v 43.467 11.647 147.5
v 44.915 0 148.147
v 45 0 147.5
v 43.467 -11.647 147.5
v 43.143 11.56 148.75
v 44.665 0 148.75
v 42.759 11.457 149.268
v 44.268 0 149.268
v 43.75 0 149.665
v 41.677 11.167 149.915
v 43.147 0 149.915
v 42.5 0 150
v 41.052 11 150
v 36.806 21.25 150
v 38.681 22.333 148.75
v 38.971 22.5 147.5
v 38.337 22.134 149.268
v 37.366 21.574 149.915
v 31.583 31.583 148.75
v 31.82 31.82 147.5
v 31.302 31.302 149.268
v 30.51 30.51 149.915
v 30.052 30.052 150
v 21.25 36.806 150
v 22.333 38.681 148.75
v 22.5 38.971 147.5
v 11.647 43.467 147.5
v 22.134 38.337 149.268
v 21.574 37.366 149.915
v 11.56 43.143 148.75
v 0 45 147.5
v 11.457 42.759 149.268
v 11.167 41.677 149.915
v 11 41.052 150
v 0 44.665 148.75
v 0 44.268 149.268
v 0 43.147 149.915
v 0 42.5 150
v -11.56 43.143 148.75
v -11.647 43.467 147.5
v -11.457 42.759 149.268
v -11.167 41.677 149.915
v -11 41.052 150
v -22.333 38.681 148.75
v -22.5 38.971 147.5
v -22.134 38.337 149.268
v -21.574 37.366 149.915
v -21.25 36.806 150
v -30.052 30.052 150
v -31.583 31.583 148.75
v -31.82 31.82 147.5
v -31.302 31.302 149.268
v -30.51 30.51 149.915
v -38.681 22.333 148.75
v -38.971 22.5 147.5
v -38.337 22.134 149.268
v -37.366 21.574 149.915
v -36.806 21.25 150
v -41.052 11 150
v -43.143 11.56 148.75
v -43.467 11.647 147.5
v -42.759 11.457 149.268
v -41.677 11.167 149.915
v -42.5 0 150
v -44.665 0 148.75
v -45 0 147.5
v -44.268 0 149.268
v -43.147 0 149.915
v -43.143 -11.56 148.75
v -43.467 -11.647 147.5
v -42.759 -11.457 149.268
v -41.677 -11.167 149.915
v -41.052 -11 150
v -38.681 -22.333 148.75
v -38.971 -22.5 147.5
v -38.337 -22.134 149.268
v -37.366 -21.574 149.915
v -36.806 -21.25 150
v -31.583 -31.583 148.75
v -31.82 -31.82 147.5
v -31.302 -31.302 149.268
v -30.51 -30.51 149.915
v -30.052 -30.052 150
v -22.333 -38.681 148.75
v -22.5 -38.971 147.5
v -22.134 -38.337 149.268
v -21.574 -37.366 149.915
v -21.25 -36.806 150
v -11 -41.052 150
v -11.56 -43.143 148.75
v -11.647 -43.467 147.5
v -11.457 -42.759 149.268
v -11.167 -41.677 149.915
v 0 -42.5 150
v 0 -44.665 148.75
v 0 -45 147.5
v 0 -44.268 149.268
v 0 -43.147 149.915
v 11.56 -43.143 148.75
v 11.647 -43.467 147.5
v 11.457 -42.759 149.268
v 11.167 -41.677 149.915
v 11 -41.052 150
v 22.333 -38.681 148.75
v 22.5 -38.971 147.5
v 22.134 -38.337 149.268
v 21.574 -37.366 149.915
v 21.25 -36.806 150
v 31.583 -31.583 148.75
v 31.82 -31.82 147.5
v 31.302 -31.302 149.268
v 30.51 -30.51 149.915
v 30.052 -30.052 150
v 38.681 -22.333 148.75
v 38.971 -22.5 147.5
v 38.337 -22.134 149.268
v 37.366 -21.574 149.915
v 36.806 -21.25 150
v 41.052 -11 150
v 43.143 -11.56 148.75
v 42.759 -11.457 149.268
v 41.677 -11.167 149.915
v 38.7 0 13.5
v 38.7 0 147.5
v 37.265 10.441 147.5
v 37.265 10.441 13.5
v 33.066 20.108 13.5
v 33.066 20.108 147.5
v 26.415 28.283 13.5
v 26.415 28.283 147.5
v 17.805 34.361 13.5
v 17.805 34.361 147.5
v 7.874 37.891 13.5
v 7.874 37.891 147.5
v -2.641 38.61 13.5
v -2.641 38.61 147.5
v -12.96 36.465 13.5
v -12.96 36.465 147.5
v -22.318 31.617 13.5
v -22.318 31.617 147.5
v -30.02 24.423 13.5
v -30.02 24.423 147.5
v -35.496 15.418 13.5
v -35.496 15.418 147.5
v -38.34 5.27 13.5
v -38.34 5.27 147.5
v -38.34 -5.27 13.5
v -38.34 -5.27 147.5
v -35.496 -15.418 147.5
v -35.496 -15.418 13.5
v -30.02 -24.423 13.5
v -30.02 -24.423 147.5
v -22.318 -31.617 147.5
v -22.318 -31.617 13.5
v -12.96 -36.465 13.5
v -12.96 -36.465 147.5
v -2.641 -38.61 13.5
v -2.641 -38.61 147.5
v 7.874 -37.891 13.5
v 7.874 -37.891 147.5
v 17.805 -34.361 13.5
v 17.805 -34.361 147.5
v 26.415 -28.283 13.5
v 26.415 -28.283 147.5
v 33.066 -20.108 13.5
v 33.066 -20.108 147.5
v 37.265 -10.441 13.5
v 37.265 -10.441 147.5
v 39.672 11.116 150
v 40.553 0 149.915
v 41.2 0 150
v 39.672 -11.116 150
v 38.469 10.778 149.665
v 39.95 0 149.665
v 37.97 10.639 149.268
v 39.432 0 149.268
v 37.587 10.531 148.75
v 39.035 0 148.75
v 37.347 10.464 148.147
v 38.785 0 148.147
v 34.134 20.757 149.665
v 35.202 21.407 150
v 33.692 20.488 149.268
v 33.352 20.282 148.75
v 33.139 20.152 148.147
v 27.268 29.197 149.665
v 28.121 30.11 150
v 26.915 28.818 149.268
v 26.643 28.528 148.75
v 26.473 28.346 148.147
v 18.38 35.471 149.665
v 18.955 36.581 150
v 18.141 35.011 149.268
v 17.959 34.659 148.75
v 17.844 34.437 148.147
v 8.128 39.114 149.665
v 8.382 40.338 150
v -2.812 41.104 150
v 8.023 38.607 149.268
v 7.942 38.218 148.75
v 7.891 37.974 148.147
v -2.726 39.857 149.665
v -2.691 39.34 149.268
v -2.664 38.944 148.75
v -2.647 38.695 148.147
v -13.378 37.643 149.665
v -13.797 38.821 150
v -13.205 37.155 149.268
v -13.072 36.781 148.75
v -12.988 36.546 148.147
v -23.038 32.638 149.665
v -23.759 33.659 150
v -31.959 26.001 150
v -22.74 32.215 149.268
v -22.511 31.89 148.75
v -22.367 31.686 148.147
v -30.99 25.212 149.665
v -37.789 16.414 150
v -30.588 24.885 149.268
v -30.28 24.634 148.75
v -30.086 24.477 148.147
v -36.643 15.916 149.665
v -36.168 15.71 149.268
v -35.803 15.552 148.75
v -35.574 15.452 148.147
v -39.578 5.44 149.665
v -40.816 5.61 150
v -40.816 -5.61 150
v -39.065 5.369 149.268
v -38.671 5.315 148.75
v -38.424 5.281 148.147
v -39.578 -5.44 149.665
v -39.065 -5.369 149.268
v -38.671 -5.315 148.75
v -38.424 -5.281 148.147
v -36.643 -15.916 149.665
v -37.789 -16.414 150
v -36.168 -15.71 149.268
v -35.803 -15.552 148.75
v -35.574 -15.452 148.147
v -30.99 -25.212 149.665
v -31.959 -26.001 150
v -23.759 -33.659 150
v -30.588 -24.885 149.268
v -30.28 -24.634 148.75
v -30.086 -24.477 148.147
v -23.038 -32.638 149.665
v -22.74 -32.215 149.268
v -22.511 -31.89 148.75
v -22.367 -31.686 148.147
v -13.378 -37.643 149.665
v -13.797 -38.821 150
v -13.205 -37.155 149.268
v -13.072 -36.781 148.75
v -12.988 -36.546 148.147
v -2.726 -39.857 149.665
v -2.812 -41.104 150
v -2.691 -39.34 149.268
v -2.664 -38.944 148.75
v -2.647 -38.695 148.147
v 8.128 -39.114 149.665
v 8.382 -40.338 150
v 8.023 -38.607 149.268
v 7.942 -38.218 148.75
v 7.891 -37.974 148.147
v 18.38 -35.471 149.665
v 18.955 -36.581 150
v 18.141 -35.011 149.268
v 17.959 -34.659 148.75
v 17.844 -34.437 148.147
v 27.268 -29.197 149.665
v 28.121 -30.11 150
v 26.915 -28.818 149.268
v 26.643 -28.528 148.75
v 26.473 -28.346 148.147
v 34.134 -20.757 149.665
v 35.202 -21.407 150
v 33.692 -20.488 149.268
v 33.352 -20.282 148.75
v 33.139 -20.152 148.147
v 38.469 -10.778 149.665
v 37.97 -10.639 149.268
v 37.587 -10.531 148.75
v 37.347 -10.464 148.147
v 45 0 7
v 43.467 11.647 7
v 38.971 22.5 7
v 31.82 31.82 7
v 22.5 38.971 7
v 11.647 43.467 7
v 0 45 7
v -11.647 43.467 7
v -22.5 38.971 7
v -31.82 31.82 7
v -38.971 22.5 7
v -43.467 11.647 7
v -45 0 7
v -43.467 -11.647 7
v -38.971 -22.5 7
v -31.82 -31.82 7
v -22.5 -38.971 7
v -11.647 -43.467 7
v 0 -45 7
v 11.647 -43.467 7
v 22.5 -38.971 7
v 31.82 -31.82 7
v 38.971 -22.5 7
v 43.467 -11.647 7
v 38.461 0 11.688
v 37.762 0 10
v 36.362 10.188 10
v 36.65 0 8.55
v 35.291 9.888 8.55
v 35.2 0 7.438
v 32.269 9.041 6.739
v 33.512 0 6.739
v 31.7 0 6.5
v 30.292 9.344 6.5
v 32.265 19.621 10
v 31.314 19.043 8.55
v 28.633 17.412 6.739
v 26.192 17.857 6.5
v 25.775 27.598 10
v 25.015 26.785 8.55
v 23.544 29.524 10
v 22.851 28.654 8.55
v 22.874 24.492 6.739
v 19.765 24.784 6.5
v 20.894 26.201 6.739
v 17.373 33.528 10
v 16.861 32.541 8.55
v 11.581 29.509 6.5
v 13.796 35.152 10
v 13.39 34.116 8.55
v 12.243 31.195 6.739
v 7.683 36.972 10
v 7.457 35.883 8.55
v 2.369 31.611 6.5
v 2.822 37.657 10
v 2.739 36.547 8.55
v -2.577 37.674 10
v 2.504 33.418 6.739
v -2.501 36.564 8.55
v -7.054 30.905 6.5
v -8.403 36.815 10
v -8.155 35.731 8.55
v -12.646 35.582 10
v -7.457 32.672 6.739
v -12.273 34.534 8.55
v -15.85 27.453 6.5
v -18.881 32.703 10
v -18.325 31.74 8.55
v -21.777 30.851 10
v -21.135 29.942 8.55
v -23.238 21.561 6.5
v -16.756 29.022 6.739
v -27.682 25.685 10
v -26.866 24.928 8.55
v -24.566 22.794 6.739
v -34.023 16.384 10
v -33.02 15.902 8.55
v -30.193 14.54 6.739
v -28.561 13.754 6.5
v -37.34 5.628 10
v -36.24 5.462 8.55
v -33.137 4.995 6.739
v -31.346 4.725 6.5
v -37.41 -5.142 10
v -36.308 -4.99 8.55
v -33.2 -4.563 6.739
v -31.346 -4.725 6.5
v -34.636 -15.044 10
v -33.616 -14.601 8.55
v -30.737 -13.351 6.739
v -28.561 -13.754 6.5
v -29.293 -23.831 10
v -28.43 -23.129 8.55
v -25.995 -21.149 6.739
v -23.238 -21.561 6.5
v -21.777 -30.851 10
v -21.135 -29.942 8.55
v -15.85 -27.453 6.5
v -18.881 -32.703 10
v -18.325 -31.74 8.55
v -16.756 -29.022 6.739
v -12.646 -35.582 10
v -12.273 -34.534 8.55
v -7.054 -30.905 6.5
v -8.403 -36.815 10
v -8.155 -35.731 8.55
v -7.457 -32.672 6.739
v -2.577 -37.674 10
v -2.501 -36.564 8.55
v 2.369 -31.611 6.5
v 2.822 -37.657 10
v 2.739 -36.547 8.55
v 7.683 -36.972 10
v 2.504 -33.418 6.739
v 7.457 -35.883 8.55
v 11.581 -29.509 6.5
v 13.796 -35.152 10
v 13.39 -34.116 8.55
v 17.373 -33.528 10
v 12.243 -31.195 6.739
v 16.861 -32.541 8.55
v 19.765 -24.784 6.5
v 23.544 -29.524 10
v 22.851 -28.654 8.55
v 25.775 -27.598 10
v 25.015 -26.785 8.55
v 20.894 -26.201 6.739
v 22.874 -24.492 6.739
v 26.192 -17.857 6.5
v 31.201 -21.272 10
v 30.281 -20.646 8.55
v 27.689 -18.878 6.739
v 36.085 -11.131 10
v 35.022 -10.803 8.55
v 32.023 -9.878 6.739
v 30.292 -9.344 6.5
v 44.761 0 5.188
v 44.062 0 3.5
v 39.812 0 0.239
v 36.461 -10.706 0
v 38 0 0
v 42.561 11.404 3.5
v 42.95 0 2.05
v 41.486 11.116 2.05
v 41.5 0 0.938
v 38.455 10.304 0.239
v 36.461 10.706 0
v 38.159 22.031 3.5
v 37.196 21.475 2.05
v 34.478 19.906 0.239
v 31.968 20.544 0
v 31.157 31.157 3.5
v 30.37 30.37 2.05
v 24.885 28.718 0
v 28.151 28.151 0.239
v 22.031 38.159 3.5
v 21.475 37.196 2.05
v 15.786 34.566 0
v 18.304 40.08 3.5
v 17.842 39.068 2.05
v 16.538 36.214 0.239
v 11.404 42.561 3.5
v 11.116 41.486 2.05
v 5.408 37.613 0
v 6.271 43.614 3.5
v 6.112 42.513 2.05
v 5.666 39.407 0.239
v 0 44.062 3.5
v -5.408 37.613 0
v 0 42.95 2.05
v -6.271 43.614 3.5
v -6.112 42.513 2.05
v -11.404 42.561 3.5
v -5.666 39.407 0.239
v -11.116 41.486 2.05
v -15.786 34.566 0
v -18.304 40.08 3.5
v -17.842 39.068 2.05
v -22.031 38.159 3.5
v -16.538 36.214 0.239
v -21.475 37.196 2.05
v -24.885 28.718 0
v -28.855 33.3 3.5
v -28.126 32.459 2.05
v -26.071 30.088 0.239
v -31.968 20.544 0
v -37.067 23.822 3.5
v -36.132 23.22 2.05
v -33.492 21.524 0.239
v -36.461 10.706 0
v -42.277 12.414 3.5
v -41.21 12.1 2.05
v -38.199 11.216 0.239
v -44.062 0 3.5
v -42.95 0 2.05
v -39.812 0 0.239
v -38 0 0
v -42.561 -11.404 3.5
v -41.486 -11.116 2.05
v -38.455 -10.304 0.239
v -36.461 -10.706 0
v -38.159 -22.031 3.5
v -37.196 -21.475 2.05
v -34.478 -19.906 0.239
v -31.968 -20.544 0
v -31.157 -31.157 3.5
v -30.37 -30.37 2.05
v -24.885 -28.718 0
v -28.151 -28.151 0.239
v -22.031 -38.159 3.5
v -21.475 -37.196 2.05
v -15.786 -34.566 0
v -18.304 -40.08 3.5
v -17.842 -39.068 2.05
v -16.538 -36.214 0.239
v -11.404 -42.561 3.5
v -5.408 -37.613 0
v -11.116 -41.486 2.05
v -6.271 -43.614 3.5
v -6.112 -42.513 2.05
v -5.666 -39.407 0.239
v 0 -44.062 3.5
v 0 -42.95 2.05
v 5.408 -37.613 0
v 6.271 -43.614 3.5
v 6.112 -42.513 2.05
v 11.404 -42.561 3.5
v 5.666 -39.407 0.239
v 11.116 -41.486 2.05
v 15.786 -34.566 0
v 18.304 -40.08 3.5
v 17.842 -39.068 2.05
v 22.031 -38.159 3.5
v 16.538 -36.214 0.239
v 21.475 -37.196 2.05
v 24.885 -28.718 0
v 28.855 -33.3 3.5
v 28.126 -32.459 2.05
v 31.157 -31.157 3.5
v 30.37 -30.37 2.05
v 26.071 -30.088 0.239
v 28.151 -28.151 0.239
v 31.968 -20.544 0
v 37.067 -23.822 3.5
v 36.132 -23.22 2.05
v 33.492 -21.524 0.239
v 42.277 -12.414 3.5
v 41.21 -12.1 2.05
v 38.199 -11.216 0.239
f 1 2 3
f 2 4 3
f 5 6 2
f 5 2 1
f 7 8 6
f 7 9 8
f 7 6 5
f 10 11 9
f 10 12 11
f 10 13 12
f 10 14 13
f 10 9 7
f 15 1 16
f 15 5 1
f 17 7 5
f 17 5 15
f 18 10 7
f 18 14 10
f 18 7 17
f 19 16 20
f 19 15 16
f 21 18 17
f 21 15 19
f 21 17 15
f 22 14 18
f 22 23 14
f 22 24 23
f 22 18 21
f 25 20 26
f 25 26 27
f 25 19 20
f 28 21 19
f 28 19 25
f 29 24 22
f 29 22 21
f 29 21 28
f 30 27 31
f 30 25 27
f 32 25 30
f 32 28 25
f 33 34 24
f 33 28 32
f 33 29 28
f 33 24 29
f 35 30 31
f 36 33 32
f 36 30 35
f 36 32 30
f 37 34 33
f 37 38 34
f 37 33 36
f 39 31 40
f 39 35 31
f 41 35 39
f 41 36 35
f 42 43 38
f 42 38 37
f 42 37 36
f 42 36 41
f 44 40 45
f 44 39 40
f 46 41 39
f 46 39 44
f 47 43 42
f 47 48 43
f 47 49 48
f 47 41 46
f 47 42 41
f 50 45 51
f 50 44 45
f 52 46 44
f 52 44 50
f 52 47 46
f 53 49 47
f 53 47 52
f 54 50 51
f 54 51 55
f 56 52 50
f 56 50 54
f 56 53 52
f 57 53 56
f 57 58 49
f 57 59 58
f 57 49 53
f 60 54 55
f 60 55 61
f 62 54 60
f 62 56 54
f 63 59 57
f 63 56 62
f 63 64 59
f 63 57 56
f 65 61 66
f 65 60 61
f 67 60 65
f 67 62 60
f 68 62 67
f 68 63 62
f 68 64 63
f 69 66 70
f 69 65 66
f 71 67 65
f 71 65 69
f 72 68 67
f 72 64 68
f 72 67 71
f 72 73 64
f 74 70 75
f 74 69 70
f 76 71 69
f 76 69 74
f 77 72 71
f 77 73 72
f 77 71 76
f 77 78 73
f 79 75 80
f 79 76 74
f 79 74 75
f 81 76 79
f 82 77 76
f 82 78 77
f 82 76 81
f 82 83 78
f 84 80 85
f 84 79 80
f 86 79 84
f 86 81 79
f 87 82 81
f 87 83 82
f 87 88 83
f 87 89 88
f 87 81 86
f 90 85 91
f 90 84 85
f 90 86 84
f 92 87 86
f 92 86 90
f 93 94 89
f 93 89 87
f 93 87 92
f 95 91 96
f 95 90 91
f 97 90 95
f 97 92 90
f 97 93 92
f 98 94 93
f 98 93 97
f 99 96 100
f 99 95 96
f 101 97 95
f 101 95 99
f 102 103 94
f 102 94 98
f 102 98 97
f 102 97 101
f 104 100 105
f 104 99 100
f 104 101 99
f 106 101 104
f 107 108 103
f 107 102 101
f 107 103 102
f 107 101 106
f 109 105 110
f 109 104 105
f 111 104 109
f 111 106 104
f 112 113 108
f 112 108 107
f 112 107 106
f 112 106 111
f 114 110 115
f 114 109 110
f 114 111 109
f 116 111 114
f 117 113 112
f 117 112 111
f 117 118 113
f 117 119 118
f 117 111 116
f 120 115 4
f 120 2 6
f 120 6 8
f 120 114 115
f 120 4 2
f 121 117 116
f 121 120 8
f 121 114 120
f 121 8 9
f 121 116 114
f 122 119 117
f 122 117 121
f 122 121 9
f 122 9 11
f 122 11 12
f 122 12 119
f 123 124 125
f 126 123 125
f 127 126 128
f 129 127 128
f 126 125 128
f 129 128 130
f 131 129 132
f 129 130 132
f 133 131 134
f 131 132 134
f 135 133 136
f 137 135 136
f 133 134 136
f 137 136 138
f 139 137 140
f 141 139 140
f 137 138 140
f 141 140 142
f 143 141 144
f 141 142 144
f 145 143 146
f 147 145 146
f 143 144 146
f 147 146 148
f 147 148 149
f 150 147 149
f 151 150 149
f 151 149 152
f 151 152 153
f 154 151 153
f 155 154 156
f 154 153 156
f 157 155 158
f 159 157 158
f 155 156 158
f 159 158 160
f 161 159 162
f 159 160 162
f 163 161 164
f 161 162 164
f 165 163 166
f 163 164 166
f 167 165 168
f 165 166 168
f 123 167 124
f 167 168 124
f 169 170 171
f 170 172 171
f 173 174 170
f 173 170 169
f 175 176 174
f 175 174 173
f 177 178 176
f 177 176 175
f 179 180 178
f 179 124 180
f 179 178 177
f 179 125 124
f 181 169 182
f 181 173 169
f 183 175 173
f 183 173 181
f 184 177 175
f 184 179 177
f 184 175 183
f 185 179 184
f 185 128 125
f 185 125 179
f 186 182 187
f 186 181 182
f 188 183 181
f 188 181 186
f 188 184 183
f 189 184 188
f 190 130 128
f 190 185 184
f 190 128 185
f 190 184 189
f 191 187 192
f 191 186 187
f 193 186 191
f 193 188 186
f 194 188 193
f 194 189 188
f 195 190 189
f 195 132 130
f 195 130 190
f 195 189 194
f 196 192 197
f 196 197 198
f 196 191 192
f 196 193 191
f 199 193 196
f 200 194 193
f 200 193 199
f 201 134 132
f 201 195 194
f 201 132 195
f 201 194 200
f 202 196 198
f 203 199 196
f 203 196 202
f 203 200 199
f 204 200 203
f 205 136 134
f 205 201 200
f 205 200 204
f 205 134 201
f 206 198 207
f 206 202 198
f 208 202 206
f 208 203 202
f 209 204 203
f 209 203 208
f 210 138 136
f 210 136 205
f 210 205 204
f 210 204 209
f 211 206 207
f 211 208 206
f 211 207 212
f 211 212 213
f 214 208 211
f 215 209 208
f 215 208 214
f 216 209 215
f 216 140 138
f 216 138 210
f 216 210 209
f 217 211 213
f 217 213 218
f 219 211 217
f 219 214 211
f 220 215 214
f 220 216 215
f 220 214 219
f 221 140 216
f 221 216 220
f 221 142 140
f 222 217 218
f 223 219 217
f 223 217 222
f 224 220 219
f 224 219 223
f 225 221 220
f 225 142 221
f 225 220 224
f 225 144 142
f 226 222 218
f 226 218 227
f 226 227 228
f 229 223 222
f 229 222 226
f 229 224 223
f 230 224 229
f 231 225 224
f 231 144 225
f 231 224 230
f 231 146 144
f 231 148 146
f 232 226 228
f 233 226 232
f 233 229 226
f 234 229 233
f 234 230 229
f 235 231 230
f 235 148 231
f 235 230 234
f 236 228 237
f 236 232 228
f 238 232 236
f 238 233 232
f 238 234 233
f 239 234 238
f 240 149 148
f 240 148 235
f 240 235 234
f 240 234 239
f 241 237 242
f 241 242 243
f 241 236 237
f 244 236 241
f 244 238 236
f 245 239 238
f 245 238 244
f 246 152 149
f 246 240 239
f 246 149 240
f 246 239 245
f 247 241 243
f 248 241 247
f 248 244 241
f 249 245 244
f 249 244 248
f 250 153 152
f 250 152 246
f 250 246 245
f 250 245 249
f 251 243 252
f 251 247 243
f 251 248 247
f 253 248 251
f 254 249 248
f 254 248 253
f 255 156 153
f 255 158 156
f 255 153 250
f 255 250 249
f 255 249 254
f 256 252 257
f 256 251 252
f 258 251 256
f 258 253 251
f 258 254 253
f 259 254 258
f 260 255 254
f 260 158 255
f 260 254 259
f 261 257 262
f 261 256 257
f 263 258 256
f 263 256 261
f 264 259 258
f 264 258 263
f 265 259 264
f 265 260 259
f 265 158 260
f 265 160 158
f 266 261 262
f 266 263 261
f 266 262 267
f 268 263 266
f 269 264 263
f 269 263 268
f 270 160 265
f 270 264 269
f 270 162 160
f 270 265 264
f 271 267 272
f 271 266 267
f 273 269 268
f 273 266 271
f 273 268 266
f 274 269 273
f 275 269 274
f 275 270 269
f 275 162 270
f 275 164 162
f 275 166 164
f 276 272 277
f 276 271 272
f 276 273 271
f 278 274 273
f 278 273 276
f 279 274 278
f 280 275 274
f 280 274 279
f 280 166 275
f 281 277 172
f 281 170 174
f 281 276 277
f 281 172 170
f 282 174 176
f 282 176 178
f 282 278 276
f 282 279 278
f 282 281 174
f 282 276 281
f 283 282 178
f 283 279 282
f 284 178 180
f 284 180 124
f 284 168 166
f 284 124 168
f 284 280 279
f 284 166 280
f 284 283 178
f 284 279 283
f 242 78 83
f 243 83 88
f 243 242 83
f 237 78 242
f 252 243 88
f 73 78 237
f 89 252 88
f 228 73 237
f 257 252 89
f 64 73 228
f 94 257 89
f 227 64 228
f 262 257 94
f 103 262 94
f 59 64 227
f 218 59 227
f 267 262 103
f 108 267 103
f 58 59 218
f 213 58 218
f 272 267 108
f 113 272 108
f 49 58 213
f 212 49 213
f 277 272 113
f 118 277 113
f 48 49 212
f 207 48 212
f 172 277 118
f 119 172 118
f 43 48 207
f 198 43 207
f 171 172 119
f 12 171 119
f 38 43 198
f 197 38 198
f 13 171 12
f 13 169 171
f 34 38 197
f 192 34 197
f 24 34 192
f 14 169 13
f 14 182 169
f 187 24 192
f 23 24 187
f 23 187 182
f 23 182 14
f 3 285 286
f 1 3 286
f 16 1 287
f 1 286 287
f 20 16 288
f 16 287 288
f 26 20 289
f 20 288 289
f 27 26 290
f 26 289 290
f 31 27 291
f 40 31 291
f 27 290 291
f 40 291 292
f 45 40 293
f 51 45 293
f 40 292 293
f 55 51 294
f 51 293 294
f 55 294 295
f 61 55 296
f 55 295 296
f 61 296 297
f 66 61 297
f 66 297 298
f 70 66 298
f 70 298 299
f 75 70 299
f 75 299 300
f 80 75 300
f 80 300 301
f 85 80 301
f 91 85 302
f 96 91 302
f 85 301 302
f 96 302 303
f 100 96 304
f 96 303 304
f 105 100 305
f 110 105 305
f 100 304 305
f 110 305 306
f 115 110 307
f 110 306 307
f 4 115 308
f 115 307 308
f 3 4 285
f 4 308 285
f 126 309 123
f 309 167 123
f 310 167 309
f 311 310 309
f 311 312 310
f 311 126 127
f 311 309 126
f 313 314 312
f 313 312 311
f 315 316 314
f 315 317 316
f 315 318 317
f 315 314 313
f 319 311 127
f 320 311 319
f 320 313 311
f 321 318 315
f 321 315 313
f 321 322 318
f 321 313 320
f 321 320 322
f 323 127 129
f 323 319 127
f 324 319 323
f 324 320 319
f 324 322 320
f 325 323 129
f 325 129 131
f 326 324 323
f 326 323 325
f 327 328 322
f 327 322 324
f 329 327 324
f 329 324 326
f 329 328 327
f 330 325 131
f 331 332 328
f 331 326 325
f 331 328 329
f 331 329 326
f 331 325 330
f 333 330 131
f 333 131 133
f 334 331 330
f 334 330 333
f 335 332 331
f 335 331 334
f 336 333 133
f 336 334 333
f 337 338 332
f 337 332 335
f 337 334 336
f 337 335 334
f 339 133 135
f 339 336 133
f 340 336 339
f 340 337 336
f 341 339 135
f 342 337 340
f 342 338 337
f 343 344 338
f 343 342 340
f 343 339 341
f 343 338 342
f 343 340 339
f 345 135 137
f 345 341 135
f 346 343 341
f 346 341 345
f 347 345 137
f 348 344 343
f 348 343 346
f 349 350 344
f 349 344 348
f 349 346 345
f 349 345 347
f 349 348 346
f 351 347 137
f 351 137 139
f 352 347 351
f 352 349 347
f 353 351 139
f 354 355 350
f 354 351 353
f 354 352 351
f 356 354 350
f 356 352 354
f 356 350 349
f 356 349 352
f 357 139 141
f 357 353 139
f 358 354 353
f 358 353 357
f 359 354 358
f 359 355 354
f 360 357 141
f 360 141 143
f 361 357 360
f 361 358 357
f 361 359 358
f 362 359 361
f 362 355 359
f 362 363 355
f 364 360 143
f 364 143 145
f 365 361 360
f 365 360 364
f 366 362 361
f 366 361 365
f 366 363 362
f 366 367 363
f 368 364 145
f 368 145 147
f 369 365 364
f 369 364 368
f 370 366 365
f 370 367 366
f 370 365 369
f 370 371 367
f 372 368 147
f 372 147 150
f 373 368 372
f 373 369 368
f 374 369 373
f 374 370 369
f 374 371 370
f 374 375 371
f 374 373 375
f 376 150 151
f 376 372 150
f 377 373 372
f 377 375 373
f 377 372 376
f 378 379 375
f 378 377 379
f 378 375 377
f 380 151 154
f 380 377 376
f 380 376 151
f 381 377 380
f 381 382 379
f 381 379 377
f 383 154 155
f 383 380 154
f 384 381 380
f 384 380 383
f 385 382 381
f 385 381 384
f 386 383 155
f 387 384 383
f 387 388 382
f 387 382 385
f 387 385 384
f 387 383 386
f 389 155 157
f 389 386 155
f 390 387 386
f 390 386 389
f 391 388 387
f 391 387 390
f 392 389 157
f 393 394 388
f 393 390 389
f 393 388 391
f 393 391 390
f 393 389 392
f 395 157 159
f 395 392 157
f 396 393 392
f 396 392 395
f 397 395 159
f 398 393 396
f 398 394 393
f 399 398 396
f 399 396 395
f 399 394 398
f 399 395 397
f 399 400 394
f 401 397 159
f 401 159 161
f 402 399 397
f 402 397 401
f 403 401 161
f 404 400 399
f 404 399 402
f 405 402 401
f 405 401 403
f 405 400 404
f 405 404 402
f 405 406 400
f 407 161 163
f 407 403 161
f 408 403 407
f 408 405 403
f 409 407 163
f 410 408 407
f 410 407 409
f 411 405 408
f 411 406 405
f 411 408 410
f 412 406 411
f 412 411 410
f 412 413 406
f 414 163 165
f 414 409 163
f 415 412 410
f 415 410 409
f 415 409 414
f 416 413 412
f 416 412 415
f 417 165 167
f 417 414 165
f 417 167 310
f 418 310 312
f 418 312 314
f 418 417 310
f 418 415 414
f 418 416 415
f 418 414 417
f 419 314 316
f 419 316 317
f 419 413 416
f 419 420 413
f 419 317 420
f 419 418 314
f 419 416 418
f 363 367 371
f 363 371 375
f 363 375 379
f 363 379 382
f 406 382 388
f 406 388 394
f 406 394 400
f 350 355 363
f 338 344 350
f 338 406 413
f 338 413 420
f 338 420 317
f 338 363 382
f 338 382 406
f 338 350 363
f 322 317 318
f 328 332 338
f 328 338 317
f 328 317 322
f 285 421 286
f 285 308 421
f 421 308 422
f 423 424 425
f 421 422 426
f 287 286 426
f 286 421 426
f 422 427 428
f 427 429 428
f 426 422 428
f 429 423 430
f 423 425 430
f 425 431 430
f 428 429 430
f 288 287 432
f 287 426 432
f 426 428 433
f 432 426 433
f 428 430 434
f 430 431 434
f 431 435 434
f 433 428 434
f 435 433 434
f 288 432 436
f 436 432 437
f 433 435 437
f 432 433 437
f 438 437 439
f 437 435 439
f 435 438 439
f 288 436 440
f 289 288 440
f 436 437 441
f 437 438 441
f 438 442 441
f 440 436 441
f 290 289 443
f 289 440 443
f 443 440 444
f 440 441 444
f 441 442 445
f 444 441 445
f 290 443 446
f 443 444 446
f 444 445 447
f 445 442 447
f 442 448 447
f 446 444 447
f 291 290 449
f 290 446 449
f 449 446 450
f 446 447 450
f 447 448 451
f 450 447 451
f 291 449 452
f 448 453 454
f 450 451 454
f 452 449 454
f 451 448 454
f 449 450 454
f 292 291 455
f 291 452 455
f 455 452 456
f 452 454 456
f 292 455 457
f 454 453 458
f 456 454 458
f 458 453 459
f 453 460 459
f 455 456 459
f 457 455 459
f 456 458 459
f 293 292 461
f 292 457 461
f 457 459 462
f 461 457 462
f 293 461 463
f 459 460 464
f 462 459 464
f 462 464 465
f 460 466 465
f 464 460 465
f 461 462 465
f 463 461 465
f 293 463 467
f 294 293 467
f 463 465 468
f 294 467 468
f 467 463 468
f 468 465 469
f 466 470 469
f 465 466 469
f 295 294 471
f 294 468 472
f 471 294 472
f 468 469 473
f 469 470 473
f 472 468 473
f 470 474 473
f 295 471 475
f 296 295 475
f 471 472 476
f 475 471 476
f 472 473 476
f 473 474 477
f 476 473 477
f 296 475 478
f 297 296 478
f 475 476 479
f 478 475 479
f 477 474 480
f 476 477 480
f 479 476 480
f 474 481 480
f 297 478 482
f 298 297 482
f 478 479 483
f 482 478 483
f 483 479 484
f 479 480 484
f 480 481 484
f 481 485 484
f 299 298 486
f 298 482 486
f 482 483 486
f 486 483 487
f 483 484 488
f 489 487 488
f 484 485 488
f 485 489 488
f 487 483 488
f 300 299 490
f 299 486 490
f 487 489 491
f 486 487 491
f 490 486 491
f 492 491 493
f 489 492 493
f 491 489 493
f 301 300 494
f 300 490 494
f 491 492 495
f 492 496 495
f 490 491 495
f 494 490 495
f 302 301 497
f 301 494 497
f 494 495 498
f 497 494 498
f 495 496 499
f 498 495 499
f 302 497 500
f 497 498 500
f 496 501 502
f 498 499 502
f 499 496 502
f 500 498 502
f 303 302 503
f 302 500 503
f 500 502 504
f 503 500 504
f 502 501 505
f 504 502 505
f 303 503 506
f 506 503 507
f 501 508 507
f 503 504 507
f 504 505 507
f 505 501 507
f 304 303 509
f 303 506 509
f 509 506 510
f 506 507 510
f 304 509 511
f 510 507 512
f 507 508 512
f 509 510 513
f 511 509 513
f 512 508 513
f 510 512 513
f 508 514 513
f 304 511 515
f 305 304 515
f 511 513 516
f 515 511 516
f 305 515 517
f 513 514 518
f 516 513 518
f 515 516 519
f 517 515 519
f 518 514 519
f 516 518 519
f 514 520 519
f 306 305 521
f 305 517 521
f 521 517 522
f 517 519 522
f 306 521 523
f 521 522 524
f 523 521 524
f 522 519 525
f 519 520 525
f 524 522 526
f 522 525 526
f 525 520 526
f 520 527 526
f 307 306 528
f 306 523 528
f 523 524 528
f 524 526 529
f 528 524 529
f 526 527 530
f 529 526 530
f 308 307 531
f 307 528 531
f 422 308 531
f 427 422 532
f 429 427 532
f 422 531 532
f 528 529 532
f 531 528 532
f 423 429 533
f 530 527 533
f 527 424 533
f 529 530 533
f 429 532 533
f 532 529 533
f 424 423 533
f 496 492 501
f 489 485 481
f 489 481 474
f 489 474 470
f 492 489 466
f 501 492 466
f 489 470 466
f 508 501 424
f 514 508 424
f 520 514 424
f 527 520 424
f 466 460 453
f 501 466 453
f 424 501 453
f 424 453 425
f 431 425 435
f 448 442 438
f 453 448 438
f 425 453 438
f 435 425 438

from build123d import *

# Parameters (mm, degrees)
F0_R     = 45
F1_DEPTH = 150
F2_R     = 38.7
F4_DEPTH = 143.5
F5_R     = 2.5
F6_R     = 7


with BuildPart() as f1:
    # F0 (on Top) → F1 (new body)
    with BuildSketch(Plane.XY):
        Circle(F0_R)
    extrude(amount=F1_DEPTH)

    # F2 (on face) → F4 (cut, through all)
    with BuildSketch(Plane.XY.offset(150)):
        Circle(F2_R)
    extrude(amount=-F4_DEPTH, mode=Mode.SUBTRACT)

    # F5
    f5_edges = [f1.edges().sort_by_distance(p)[0] for p in [
        (-45, 0, 150),
        (-38.7, 0, 150),
    ]]
    fillet(f5_edges, radius=F5_R)

    # F6
    f6_edges = [f1.edges().sort_by_distance(p)[0] for p in [
        (-38.7, 0, 6.5),
        (-45, 0, 0),
    ]]
    fillet(f6_edges, radius=F6_R)


solid = f1.part
